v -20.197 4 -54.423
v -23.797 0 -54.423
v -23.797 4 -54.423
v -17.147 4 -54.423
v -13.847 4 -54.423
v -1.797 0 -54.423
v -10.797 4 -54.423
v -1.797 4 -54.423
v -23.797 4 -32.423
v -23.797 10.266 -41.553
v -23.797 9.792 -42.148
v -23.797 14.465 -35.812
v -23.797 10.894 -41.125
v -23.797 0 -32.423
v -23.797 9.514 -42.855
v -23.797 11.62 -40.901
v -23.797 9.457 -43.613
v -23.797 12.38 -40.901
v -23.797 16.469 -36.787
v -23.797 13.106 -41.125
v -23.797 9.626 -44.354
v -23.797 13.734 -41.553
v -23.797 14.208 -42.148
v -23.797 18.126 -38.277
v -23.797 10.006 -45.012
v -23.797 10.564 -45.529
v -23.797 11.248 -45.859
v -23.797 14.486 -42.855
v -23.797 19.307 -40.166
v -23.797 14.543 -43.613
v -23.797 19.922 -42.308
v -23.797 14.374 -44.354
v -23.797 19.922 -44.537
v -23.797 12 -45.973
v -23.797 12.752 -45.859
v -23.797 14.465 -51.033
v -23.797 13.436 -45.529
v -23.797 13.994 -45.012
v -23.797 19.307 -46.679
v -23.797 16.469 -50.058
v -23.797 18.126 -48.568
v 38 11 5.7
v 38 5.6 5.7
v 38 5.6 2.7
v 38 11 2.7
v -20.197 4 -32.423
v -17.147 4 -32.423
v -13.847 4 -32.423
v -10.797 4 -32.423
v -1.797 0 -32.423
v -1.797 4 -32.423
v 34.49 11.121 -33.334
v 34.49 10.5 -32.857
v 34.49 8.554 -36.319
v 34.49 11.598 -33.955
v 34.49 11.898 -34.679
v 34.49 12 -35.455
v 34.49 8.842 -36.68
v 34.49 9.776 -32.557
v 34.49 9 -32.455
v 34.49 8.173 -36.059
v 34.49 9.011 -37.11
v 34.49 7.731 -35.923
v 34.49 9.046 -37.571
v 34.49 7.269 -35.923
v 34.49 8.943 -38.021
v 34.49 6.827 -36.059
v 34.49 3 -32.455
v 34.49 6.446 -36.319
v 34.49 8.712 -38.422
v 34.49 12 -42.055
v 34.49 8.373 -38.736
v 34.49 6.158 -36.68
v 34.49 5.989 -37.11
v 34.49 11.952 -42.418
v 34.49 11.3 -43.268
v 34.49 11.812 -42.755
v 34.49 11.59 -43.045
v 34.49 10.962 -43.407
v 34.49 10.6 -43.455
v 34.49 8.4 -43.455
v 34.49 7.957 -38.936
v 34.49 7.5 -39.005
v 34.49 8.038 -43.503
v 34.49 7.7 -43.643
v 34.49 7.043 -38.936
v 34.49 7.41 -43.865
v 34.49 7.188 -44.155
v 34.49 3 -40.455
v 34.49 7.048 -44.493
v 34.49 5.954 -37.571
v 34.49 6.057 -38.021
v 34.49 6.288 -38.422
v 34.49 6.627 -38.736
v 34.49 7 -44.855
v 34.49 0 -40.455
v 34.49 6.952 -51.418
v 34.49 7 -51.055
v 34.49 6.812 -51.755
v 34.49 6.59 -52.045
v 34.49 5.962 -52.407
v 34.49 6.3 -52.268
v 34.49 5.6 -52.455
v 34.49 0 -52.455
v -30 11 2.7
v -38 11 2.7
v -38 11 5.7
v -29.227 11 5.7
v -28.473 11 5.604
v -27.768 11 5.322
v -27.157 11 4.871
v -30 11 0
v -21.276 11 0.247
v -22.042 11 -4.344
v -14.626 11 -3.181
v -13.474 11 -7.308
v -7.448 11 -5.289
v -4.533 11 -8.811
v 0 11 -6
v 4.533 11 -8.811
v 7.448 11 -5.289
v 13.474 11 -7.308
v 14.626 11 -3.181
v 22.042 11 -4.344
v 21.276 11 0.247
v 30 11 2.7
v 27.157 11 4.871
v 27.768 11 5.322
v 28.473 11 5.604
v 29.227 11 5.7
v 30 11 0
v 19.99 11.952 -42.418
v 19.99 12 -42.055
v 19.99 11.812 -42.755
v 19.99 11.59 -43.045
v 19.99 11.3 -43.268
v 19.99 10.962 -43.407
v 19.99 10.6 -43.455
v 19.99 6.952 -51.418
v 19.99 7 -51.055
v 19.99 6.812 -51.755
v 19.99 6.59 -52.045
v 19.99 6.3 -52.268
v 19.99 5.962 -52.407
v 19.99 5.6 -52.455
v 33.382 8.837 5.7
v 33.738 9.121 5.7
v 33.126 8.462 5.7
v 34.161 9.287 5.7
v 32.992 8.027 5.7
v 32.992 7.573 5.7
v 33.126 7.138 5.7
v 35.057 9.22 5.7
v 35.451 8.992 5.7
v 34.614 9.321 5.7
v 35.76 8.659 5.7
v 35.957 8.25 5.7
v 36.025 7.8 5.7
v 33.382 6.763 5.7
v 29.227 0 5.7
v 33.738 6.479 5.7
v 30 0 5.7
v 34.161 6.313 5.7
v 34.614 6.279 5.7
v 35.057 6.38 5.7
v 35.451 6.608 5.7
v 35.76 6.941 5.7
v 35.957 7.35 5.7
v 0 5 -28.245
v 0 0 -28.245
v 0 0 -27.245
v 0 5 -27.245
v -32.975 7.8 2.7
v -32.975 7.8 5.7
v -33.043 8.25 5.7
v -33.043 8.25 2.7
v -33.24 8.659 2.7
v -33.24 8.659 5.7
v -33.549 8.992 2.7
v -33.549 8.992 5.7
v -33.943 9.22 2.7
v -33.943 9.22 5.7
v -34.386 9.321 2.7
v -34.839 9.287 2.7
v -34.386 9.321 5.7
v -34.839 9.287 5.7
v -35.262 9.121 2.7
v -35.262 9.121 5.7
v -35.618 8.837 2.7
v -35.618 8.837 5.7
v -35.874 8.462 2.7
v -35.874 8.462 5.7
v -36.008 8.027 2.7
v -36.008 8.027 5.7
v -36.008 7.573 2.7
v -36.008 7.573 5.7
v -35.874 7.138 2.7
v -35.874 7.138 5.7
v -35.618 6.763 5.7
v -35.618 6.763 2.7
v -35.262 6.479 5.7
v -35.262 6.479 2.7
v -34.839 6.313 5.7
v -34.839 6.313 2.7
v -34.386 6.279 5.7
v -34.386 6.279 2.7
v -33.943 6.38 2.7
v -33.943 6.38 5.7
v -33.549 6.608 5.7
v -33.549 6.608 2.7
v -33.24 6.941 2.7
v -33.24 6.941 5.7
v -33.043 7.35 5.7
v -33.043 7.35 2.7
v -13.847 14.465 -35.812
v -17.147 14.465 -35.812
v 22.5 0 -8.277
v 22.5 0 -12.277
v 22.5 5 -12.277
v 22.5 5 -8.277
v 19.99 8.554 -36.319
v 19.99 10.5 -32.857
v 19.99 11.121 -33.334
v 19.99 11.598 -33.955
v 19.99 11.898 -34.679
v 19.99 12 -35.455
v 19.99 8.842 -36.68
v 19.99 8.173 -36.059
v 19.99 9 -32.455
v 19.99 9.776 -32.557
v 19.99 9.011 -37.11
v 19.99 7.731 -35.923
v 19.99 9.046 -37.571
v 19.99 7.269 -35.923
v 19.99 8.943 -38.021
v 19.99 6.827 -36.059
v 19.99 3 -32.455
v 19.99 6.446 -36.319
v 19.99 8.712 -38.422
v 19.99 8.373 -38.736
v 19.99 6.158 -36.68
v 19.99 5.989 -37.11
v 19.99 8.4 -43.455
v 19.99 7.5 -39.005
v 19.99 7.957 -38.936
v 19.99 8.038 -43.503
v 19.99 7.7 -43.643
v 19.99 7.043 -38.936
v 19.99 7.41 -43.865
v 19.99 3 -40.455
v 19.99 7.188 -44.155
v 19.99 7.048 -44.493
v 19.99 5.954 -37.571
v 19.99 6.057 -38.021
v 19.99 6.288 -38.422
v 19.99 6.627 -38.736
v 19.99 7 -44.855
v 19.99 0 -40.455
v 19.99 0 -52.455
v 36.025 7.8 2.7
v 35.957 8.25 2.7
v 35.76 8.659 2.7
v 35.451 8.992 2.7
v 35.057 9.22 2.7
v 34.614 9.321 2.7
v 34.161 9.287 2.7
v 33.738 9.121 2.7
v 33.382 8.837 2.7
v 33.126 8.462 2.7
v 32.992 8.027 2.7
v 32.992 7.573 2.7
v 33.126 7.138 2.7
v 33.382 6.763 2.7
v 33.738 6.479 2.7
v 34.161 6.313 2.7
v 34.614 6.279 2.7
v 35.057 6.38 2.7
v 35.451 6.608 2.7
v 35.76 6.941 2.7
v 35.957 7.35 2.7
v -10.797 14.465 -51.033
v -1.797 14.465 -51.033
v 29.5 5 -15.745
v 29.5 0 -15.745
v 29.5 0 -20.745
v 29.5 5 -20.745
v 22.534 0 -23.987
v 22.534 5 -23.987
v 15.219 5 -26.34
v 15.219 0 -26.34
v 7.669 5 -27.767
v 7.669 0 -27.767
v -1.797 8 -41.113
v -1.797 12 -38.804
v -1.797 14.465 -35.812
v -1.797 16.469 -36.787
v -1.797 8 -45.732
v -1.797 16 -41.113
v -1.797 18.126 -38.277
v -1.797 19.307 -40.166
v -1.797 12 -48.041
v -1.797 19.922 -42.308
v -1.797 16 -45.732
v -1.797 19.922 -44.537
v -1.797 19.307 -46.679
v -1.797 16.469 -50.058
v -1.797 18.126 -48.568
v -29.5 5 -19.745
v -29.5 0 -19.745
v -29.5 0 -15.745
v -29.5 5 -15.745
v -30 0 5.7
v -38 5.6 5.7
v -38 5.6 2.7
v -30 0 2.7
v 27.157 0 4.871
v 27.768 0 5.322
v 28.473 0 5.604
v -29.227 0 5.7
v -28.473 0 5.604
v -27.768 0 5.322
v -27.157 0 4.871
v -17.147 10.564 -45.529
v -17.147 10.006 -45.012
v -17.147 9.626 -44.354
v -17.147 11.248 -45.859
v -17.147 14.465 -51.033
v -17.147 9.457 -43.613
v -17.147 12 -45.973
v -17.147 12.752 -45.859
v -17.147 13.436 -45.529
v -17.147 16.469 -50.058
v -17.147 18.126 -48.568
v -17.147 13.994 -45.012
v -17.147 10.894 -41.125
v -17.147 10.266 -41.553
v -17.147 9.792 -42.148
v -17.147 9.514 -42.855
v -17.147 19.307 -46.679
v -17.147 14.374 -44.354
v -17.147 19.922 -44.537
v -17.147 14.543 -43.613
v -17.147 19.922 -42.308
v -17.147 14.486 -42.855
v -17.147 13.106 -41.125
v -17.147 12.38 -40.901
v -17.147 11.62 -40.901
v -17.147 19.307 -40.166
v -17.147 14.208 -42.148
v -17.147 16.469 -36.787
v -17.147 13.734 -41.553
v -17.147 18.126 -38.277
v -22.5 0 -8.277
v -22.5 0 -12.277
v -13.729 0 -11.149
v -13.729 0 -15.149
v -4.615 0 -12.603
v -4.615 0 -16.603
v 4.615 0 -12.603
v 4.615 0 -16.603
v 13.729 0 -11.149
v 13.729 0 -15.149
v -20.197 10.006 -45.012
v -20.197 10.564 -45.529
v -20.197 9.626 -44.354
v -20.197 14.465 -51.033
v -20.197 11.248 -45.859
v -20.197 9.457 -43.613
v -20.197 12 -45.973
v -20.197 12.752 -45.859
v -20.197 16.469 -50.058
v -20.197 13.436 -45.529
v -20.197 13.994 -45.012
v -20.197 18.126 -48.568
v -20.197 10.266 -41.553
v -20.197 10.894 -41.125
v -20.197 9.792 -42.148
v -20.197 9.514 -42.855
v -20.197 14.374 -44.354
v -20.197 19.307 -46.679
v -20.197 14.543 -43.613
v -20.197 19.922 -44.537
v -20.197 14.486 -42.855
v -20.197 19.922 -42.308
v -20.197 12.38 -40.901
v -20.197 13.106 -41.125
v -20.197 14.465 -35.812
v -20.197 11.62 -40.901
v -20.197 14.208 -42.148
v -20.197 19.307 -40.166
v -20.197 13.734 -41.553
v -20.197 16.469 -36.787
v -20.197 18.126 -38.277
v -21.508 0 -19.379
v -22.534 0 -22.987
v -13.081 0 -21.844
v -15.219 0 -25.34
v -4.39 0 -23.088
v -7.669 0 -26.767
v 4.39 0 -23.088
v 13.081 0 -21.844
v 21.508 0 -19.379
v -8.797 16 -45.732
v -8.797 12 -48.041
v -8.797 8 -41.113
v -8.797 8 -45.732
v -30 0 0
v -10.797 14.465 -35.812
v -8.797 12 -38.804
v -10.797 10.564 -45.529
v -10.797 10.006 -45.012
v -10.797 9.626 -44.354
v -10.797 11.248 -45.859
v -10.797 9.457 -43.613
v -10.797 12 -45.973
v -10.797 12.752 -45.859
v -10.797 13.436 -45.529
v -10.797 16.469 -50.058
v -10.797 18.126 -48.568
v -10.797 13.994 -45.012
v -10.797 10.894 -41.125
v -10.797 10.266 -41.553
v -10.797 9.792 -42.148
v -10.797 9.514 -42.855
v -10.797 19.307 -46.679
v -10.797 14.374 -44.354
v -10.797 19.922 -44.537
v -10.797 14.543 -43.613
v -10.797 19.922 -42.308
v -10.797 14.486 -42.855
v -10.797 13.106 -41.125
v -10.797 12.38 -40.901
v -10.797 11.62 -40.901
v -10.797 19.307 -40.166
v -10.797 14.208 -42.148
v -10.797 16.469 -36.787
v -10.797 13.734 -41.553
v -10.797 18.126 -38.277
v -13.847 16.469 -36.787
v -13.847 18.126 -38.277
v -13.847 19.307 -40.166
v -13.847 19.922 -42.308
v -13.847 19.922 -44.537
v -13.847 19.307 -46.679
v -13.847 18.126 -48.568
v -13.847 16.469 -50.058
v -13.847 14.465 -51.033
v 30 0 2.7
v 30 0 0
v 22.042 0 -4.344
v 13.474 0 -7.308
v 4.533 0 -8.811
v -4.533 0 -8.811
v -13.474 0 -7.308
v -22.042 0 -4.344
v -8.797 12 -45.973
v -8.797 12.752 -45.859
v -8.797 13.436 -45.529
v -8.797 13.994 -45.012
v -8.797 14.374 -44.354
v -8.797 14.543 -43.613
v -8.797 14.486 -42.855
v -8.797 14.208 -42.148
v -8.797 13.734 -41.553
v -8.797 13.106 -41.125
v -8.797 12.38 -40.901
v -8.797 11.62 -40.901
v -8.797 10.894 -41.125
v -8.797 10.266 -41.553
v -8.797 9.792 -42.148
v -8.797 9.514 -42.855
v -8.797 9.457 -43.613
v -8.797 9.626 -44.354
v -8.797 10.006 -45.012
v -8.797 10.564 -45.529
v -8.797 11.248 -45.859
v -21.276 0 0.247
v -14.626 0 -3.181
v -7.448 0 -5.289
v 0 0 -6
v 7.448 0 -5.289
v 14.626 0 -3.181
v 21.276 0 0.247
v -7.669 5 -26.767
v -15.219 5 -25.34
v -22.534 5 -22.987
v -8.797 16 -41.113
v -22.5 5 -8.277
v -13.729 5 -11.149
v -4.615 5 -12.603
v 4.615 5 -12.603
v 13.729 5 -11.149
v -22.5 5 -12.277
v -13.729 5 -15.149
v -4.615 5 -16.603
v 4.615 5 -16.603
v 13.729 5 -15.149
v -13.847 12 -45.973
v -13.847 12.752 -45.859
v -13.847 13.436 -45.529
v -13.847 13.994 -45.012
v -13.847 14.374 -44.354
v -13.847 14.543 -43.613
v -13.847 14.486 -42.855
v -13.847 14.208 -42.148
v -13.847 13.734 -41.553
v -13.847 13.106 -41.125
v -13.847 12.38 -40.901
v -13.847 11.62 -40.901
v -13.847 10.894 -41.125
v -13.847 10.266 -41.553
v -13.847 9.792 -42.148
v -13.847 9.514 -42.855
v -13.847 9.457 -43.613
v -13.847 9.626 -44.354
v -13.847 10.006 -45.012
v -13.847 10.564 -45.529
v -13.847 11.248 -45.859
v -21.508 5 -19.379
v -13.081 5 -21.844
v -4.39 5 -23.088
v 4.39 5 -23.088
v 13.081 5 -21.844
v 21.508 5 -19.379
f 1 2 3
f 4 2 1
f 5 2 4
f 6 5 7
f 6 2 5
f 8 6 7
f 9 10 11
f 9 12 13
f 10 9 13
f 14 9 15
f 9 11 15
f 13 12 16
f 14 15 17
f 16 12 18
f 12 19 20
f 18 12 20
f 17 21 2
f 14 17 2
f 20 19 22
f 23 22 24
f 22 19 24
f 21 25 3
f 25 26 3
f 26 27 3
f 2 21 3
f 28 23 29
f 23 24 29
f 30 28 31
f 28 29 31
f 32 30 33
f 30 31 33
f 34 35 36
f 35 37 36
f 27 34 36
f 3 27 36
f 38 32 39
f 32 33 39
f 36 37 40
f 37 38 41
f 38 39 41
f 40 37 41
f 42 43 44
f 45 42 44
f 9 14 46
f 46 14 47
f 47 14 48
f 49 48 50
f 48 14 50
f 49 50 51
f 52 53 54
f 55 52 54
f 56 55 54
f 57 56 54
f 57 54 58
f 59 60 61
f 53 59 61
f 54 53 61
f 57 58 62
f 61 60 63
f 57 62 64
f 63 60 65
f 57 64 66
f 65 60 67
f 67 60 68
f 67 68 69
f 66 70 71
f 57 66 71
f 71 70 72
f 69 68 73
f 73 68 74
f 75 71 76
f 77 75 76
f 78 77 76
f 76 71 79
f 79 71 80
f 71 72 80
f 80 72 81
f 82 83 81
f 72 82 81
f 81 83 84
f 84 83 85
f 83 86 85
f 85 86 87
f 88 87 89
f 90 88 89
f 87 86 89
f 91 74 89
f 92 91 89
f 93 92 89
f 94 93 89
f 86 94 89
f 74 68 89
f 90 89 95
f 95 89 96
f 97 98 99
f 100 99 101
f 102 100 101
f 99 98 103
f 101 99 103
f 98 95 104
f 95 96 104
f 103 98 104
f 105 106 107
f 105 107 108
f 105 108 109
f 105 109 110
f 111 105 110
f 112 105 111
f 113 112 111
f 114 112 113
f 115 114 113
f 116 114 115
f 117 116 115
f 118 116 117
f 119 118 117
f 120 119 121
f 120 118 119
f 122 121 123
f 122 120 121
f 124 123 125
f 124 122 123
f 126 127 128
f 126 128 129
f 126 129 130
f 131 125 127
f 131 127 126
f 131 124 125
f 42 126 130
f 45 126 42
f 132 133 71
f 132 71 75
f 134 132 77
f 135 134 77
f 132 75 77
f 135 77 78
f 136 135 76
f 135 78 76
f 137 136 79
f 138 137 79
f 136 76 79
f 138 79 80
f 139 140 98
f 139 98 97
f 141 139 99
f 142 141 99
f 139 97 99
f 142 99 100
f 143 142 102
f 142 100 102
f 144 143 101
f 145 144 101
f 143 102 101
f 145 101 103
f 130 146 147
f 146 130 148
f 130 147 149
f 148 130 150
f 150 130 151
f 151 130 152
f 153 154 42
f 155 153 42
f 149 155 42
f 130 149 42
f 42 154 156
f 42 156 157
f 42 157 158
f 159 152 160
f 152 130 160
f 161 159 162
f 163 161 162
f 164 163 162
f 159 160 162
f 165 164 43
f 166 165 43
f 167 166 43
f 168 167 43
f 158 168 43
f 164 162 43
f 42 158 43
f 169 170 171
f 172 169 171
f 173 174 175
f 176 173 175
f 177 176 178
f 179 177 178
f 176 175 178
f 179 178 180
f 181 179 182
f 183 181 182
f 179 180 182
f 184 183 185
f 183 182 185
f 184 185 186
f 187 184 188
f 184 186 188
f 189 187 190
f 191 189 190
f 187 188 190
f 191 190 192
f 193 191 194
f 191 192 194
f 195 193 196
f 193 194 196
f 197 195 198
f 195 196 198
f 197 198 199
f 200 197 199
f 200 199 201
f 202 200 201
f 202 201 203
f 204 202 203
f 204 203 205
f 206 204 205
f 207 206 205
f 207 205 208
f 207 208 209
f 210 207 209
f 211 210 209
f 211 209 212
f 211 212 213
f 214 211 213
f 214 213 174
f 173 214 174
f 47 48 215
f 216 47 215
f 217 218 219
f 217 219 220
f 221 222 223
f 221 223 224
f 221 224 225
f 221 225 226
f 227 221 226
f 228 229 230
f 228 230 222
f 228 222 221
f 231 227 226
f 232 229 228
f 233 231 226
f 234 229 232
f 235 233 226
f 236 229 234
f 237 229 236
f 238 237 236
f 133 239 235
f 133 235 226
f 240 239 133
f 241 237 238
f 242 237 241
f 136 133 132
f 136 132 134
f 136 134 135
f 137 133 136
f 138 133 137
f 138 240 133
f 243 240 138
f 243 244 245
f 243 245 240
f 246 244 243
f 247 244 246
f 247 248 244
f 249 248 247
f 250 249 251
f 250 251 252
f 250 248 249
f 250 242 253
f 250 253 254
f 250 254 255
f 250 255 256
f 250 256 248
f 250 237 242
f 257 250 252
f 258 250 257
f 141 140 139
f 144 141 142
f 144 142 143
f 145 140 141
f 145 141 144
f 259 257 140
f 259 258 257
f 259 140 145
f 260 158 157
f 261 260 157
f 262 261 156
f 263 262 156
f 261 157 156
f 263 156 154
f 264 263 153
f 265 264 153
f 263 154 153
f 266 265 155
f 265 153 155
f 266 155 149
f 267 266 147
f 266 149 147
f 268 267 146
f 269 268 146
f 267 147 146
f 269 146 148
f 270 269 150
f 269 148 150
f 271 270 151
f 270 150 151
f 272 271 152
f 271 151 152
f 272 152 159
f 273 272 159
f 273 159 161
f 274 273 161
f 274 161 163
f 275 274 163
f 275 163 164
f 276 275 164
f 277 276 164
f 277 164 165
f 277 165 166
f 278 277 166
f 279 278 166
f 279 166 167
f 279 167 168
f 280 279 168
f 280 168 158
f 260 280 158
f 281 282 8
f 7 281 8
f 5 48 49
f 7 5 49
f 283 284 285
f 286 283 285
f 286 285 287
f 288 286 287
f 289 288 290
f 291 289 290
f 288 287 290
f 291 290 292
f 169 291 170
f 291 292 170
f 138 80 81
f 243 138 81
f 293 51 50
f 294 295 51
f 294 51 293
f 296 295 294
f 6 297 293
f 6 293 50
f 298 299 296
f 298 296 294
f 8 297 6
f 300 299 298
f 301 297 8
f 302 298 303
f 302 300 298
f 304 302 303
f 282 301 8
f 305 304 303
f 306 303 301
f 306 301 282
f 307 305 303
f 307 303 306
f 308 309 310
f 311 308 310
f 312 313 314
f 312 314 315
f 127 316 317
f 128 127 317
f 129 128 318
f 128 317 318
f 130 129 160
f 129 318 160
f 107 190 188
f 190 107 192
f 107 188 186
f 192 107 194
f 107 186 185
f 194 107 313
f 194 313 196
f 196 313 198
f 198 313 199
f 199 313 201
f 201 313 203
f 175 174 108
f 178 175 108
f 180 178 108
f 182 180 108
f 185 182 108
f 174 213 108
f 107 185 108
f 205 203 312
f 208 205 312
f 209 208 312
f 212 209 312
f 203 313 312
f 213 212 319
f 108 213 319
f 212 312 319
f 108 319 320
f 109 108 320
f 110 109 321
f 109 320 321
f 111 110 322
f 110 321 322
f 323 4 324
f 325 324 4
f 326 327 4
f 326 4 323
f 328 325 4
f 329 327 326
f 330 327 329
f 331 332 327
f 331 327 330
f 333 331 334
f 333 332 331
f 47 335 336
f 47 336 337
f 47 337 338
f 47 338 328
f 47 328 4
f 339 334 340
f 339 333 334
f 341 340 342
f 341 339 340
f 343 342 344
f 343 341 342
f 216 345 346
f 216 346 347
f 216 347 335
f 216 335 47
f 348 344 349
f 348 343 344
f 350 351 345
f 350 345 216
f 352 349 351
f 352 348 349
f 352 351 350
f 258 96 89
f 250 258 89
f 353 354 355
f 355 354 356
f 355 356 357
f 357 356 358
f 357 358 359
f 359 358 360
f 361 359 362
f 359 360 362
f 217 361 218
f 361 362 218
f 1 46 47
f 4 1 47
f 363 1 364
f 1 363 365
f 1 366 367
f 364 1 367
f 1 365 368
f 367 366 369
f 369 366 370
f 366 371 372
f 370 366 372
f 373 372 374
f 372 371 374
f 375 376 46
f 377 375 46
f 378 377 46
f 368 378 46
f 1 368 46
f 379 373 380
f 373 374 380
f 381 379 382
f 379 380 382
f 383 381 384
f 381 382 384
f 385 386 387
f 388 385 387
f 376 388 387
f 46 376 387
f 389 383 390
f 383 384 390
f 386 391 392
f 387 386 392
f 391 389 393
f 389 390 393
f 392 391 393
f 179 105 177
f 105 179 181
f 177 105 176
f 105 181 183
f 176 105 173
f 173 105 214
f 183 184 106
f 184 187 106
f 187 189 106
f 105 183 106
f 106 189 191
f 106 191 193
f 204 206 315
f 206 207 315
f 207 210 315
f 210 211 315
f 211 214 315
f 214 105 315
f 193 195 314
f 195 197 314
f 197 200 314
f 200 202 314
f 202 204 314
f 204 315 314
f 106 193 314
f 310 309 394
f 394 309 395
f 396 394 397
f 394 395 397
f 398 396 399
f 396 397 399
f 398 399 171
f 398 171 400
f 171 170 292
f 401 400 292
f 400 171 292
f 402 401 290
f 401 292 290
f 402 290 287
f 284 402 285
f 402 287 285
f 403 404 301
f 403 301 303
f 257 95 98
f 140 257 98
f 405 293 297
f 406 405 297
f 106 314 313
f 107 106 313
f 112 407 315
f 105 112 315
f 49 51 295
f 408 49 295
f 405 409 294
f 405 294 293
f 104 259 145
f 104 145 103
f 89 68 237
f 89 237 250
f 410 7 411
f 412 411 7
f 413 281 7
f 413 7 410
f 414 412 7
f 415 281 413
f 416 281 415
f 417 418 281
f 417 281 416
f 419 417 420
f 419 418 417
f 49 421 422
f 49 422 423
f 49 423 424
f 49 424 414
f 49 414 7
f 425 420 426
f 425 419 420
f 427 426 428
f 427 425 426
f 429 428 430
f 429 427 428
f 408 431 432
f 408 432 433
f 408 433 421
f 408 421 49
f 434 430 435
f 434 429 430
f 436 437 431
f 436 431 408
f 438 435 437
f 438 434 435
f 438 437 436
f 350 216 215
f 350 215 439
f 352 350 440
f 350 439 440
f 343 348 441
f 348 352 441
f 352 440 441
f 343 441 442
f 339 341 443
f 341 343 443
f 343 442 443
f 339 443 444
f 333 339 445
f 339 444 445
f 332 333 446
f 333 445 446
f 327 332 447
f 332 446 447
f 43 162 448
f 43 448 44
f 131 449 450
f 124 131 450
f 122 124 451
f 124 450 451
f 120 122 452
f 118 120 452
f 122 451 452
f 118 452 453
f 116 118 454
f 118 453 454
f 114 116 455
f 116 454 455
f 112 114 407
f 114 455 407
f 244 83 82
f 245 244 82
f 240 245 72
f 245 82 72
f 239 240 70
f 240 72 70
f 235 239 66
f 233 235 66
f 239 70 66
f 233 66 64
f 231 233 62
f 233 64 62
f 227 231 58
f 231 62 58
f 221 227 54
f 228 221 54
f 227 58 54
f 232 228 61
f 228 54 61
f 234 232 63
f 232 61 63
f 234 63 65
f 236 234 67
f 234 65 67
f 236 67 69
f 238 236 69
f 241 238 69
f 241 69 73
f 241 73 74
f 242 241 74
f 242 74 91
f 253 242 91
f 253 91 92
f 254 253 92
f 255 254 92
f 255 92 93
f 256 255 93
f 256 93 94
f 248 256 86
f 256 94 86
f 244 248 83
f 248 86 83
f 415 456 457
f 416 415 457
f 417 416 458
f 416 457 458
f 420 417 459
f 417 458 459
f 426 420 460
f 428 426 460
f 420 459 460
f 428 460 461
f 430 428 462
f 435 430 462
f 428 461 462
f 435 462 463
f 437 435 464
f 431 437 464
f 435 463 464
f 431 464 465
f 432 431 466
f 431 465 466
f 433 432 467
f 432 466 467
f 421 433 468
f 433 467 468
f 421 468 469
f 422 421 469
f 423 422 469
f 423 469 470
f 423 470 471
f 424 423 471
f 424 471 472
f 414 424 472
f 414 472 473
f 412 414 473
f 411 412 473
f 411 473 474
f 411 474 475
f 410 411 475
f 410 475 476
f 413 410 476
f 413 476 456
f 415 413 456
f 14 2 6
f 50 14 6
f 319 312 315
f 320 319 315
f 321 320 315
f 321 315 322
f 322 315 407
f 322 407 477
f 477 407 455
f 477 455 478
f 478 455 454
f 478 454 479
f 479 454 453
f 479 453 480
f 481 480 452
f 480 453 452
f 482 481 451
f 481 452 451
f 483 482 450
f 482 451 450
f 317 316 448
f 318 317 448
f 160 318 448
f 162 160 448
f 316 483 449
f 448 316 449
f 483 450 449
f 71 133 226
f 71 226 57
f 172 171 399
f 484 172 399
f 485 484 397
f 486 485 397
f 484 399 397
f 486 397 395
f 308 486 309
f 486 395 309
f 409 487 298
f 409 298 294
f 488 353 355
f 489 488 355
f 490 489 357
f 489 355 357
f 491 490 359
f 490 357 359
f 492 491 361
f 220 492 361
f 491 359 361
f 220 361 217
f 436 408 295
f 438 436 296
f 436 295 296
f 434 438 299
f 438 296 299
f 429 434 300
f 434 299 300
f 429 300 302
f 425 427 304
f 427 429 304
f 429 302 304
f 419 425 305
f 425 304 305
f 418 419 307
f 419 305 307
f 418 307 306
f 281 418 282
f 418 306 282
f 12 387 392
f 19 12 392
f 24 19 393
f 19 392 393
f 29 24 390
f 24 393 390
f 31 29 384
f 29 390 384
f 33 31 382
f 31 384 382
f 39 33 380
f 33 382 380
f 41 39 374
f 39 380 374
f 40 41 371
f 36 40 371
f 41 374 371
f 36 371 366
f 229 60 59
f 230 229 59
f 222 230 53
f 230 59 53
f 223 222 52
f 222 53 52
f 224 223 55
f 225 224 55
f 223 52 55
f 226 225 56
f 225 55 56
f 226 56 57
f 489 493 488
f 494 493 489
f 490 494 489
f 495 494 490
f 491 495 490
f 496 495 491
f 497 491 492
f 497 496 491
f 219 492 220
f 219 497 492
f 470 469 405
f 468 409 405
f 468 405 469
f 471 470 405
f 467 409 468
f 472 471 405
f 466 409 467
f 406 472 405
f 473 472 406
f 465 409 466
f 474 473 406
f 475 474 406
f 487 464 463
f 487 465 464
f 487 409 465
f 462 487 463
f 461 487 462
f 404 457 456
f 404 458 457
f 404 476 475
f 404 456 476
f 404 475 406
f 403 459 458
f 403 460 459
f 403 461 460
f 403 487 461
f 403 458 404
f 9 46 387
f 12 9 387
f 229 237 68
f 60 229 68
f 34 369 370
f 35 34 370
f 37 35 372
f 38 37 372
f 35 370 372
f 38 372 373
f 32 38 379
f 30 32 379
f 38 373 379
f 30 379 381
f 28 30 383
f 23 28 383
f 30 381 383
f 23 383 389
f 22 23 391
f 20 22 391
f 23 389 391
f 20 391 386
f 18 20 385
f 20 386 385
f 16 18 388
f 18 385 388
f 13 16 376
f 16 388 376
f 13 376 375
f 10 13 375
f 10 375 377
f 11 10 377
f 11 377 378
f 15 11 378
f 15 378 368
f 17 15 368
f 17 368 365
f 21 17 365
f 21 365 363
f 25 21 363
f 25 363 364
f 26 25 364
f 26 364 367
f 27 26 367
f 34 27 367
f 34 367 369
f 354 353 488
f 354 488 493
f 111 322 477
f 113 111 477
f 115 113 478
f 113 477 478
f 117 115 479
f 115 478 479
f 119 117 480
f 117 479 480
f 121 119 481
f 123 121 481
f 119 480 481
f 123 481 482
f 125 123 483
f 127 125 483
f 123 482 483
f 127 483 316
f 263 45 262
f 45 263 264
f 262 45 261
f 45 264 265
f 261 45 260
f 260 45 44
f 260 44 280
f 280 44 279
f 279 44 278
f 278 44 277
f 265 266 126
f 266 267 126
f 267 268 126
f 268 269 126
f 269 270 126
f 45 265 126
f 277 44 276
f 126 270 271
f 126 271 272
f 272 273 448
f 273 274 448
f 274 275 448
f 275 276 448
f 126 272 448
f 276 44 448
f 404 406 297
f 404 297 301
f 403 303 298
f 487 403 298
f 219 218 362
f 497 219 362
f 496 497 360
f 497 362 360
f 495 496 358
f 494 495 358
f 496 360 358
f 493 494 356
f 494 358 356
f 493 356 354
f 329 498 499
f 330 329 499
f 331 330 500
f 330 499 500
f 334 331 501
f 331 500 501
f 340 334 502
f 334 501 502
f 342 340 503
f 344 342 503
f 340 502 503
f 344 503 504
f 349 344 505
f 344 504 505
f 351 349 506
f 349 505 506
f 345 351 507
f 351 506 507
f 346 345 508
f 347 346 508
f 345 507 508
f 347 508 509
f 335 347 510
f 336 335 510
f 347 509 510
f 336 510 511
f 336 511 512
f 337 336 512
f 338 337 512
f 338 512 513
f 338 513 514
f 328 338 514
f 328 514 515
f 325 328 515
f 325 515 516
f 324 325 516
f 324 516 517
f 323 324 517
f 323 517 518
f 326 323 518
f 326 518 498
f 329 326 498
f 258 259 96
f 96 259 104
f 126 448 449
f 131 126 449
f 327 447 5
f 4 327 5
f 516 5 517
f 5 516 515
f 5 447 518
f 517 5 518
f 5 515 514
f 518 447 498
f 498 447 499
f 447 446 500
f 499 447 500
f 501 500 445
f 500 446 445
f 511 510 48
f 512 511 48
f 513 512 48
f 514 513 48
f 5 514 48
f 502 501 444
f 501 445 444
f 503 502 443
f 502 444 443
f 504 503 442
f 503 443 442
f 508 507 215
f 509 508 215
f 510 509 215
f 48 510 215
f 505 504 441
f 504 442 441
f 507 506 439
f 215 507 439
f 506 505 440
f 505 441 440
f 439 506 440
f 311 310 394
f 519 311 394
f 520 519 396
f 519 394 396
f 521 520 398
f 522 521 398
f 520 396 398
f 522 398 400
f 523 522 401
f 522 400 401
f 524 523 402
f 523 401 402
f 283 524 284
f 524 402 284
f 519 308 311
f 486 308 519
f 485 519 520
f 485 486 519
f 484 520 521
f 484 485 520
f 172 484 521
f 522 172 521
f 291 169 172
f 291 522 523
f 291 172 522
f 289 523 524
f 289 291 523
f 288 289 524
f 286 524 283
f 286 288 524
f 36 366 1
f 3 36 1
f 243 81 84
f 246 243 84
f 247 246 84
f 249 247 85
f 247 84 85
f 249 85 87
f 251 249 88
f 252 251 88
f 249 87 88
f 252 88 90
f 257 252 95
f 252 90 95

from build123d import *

# Parameters (mm, degrees)
BOSS_EXTRUDE1_DEPTH = 11
CUT_EXTRUDE1_REACH  = 16.7
SKETCH2_R           = 1.525
CUT_EXTRUDE12_REACH = 16.7
BOSS_EXTRUDE2_DEPTH = 5
CUT_EXTRUDE11_DEPTH = 5
BOSS_EXTRUDE3_DEPTH = 5
SKETCH10_W          = 14.5
SKETCH10_H          = 20
BOSS_EXTRUDE6_DEPTH = 12
SKETCH11_W          = 8
SKETCH11_H          = 3
CUT_EXTRUDE5_DEPTH  = 14.5
SKETCH12_R          = 1.55
CUT_EXTRUDE6_DEPTH  = 14.5
SKETCH13_W          = 22
SKETCH13_H          = 22
BOSS_EXTRUDE7_DEPTH = 4
SKETCH14_W          = 22
SKETCH14_H          = 18
SKETCH14_R          = 2.55
BOSS_EXTRUDE8_DEPTH = 22
CUT_EXTRUDE7_DEPTH  = 22
CUT_EXTRUDE8_START  = -20
SKETCH17_W          = 3.05
SKETCH17_H          = 22
CUT_EXTRUDE8_DEPTH  = 16
CUT_EXTRUDE9_DEPTH  = 7


with BuildPart() as part:
    # Sketch1 → Boss-Extrude1 (new body)
    with BuildSketch(Plane(origin=(0, 0, 0), x_dir=(1, 0, 0), z_dir=(0, 1, 0))):
        with BuildLine():
            Line((-30, 0), (-30, -2.7))
            Line((-30, -2.7), (-38, -2.7))
            Line((-38, -2.7), (-38, -5.7))
            Line((-38, -5.7), (-29.226700122, -5.7))
            ThreePointArc((-29.226700122, -5.7), (-28.111762502, -5.485123714), (-27.156540652, -4.87127607))
            ThreePointArc((-27.156540652, -4.87127607), (0, 6), (27.156540652, -4.87127607))
            ThreePointArc((27.156540652, -4.87127607), (28.111762502, -5.485123714), (29.226700122, -5.7))
            Line((29.226700122, -5.7), (38, -5.7))
            Line((38, -5.7), (38, -2.7))
            Line((38, -2.7), (30, -2.7))
            Line((30, -2.7), (30, 0))
            ThreePointArc((30, 0), (0, 9), (-30, 0))
        make_face()
    extrude(amount=BOSS_EXTRUDE1_DEPTH)

    # Sketch2 → Cut-Extrude1 (cut, up to next)
    with BuildSketch(Plane.XY.offset(5.7), mode=Mode.PRIVATE) as cut_extrude1_sk1:
        with Locations((-34.5, 7.8)):
            Circle(SKETCH2_R)
    cut_extrude1_tool1 = extrude(cut_extrude1_sk1.sketch, amount=-CUT_EXTRUDE1_REACH, mode=Mode.PRIVATE) & part.part
    add(cut_extrude1_tool1.solids().sort_by_distance((-34.5, 7.8, 5.7))[0], mode=Mode.SUBTRACT)
    # Sketch2 → Cut-Extrude1 (cut, up to next)
    with BuildSketch(Plane.XY.offset(5.7), mode=Mode.PRIVATE) as cut_extrude1_sk2:
        with Locations((34.5, 7.8)):
            Circle(SKETCH2_R)
    cut_extrude1_tool2 = extrude(cut_extrude1_sk2.sketch, amount=-CUT_EXTRUDE1_REACH, mode=Mode.PRIVATE) & part.part
    add(cut_extrude1_tool2.solids().sort_by_distance((34.5, 7.8, 5.7))[0], mode=Mode.SUBTRACT)

    # Sketch20 → Cut-Extrude12 (cut, up to next)
    with BuildSketch(Plane.XY.offset(5.7), mode=Mode.PRIVATE) as cut_extrude12_sk1:
        Polygon((-38, 5.6), (-30, 0), (-38, 0), align=None)
    cut_extrude12_tool1 = extrude(cut_extrude12_sk1.sketch, amount=-CUT_EXTRUDE12_REACH, mode=Mode.PRIVATE) & part.part
    add(cut_extrude12_tool1.solids().sort_by_distance((-35.333333, 1.866667, 5.7))[0], mode=Mode.SUBTRACT)
    # Sketch20 → Cut-Extrude12 (cut, up to next)
    with BuildSketch(Plane.XY.offset(5.7), mode=Mode.PRIVATE) as cut_extrude12_sk2:
        Polygon((38, 0), (30, 0), (38, 5.6), align=None)
    cut_extrude12_tool2 = extrude(cut_extrude12_sk2.sketch, amount=-CUT_EXTRUDE12_REACH, mode=Mode.PRIVATE) & part.part
    add(cut_extrude12_tool2.solids().sort_by_distance((35.333333, 1.866667, 5.7))[0], mode=Mode.SUBTRACT)


with BuildPart() as body_2:
    # Sketch3 → Boss-Extrude2 (new body)
    with BuildSketch(Plane(origin=(0, 0, 0), x_dir=(1, 0, 0), z_dir=(0, 1, 0))):
        with BuildLine():
            Line((-29.5, 8.785778647), (-29.5, 4.785778647))
            ThreePointArc((-29.5, 4.785778647), (0, 12.785778647), (29.5, 4.785778647))
            Line((29.5, 4.785778647), (29.5, 8.785778647))
            ThreePointArc((29.5, 8.785778647), (0, 16.785778647), (-29.5, 8.785778647))
        make_face()
    extrude(amount=BOSS_EXTRUDE2_DEPTH)

    # Sketch21 → Cut-Extrude11 (cut)
    with BuildSketch(Plane(origin=(0, 5, 0), x_dir=(1, 0, 0), z_dir=(0, 1, 0))):
        with BuildLine():
            ThreePointArc((-29.5, 4.785778647), (-26.058521382, 6.648560725), (-22.5, 8.276644791))
            Line((-22.5, 8.276644791), (-22.5, 12.276644791))
            ThreePointArc((-22.5, 12.276644791), (-26.058521382, 10.648560725), (-29.5, 8.785778647))
            Line((-29.5, 8.785778647), (-29.5, 4.785778647))
        make_face()
        with BuildLine():
            Line((22.5, 12.276644791), (22.5, 8.276644791))
            ThreePointArc((22.5, 8.276644791), (26.058521382, 6.648560725), (29.5, 4.785778647))
            Line((29.5, 4.785778647), (29.5, 8.785778647))
            ThreePointArc((29.5, 8.785778647), (26.058521382, 10.648560725), (22.5, 12.276644791))
        make_face()
    extrude(amount=-CUT_EXTRUDE11_DEPTH, mode=Mode.SUBTRACT)


with BuildPart() as body_3:
    # Sketch4 → Boss-Extrude3 (new body)
    with BuildSketch(Plane(origin=(0, 0, 0), x_dir=(1, 0, 0), z_dir=(0, 1, 0))):
        with BuildLine():
            Line((0, 28.244635791), (0, 27.244635791))
            ThreePointArc((0, 27.244635791), (-15.219231255, 25.340278728), (-29.5, 19.744635791))
            Line((-29.5, 19.744635791), (-29.5, 15.744635791))
            ThreePointArc((-29.5, 15.744635791), (0, 23.244635791), (29.5, 15.744635791))
            Line((29.5, 15.744635791), (29.5, 20.744635791))
            ThreePointArc((29.5, 20.744635791), (15.219231255, 26.340278728), (0, 28.244635791))
        make_face()
    extrude(amount=BOSS_EXTRUDE3_DEPTH)


with BuildPart() as body_4:
    # Sketch10 → Boss-Extrude6 (new body)
    with BuildSketch(Plane(origin=(0, 0, 0), x_dir=(1, 0, 0), z_dir=(0, 1, 0))):
        with Locations((27.239954972, 42.455194303)):
            Rectangle(SKETCH10_W, SKETCH10_H)
    extrude(amount=BOSS_EXTRUDE6_DEPTH)

    # Sketch11 → Cut-Extrude5 (cut)
    with BuildSketch(Plane(origin=(34.489954972, 0, 0), x_dir=(0, 0, -1), z_dir=(1, 0, 0))):
        with Locations((36.455194303, 1.5)):
            Rectangle(SKETCH11_W, SKETCH11_H)
        with BuildLine():
            Line((32.455194303, 12), (32.455194303, 9))
            ThreePointArc((32.455194303, 9), (33.333873959, 11.121320344), (35.455194303, 12))
            Line((35.455194303, 12), (32.455194303, 12))
        make_face()
        with BuildLine():
            Line((52.455194303, 12), (42.055194303, 12))
            ThreePointArc((42.055194303, 12), (43.045143797, 11.589949494), (43.455194303, 10.6))
            Line((43.455194303, 10.6), (43.455194303, 8.4))
            ThreePointArc((43.455194303, 8.4), (43.865244809, 7.410050506), (44.855194303, 7))
            Line((44.855194303, 7), (51.055194303, 7))
            ThreePointArc((51.055194303, 7), (52.045143797, 6.589949494), (52.455194303, 5.6))
            Line((52.455194303, 5.6), (52.455194303, 7))
            Line((52.455194303, 7), (52.455194303, 12))
        make_face()
    extrude(amount=-CUT_EXTRUDE5_DEPTH, mode=Mode.SUBTRACT)

    # Sketch12 → Cut-Extrude6 (cut)
    with BuildSketch(Plane(origin=(34.489954972, 0, 0), x_dir=(0, 0, -1), z_dir=(1, 0, 0))):
        with Locations((37.455194303, 7.5)):
            Circle(SKETCH12_R)
    extrude(amount=-CUT_EXTRUDE6_DEPTH, mode=Mode.SUBTRACT)


with BuildPart() as body_5:
    # Sketch13 → Boss-Extrude7 (new body)
    with BuildSketch(Plane(origin=(28.711110342, 0, 0), x_dir=(1, 0, 0), z_dir=(0, 1, 0))):
        with Locations((-41.507760914, 43.422583893)):
            Rectangle(SKETCH13_W, SKETCH13_H)
    extrude(amount=BOSS_EXTRUDE7_DEPTH)

    # Sketch14 → Boss-Extrude8 (add)
    with BuildSketch(Plane(origin=(-1.796650572, 0, 0), x_dir=(0, 0, -1), z_dir=(1, 0, 0))):
        with Locations((43.422583893, 13)):
            Rectangle(SKETCH14_W, SKETCH14_H)
        with Locations((43.422583893, 12)):
            Circle(SKETCH14_R, mode=Mode.SUBTRACT)
    extrude(amount=-BOSS_EXTRUDE8_DEPTH)

    # Sketch15 → Cut-Extrude7 (cut)
    with BuildSketch(Plane(origin=(-1.796650572, 0, 0), x_dir=(0, 0, -1), z_dir=(1, 0, 0))):
        with BuildLine():
            Line((32.422583893, 4), (35.811773083, 14.464864865))
            ThreePointArc((35.811773083, 14.464864865), (43.422583893, 20), (51.033394704, 14.464864865))
            Line((51.033394704, 14.464864865), (54.422583893, 4))
            Line((54.422583893, 4), (54.422583893, 22))
            Line((54.422583893, 22), (32.422583893, 22))
            Line((32.422583893, 22), (32.422583893, 4))
        make_face()
    extrude(amount=-CUT_EXTRUDE7_DEPTH, mode=Mode.SUBTRACT)

    # Sketch17 → Cut-Extrude8 (cut)
    with BuildSketch(Plane(origin=(28.711110342, 0, 0), x_dir=(1, 0, 0), z_dir=(0, -1, 0)).offset(CUT_EXTRUDE8_START)):
        with Locations((-47.382760914, -43.422583893)):
            Rectangle(SKETCH17_W, SKETCH17_H)
        with Locations((-41.032760914, -43.422583893)):
            Rectangle(SKETCH17_W, SKETCH17_H)
    extrude(amount=CUT_EXTRUDE8_DEPTH, mode=Mode.SUBTRACT)

    # Sketch16 → Cut-Extrude9 (cut)
    with BuildSketch(Plane(origin=(-1.796650572, 0, 0), x_dir=(0, 0, -1), z_dir=(1, 0, 0))):
        Polygon((45.73198497, 16), (41.113182817, 16), (38.80378174, 12), (41.113182817, 8), (45.73198497, 8), (48.041386047, 12), align=None)
    extrude(amount=-CUT_EXTRUDE9_DEPTH, mode=Mode.SUBTRACT)


solid = Compound([part.part, body_2.part, body_3.part, body_4.part, body_5.part])
